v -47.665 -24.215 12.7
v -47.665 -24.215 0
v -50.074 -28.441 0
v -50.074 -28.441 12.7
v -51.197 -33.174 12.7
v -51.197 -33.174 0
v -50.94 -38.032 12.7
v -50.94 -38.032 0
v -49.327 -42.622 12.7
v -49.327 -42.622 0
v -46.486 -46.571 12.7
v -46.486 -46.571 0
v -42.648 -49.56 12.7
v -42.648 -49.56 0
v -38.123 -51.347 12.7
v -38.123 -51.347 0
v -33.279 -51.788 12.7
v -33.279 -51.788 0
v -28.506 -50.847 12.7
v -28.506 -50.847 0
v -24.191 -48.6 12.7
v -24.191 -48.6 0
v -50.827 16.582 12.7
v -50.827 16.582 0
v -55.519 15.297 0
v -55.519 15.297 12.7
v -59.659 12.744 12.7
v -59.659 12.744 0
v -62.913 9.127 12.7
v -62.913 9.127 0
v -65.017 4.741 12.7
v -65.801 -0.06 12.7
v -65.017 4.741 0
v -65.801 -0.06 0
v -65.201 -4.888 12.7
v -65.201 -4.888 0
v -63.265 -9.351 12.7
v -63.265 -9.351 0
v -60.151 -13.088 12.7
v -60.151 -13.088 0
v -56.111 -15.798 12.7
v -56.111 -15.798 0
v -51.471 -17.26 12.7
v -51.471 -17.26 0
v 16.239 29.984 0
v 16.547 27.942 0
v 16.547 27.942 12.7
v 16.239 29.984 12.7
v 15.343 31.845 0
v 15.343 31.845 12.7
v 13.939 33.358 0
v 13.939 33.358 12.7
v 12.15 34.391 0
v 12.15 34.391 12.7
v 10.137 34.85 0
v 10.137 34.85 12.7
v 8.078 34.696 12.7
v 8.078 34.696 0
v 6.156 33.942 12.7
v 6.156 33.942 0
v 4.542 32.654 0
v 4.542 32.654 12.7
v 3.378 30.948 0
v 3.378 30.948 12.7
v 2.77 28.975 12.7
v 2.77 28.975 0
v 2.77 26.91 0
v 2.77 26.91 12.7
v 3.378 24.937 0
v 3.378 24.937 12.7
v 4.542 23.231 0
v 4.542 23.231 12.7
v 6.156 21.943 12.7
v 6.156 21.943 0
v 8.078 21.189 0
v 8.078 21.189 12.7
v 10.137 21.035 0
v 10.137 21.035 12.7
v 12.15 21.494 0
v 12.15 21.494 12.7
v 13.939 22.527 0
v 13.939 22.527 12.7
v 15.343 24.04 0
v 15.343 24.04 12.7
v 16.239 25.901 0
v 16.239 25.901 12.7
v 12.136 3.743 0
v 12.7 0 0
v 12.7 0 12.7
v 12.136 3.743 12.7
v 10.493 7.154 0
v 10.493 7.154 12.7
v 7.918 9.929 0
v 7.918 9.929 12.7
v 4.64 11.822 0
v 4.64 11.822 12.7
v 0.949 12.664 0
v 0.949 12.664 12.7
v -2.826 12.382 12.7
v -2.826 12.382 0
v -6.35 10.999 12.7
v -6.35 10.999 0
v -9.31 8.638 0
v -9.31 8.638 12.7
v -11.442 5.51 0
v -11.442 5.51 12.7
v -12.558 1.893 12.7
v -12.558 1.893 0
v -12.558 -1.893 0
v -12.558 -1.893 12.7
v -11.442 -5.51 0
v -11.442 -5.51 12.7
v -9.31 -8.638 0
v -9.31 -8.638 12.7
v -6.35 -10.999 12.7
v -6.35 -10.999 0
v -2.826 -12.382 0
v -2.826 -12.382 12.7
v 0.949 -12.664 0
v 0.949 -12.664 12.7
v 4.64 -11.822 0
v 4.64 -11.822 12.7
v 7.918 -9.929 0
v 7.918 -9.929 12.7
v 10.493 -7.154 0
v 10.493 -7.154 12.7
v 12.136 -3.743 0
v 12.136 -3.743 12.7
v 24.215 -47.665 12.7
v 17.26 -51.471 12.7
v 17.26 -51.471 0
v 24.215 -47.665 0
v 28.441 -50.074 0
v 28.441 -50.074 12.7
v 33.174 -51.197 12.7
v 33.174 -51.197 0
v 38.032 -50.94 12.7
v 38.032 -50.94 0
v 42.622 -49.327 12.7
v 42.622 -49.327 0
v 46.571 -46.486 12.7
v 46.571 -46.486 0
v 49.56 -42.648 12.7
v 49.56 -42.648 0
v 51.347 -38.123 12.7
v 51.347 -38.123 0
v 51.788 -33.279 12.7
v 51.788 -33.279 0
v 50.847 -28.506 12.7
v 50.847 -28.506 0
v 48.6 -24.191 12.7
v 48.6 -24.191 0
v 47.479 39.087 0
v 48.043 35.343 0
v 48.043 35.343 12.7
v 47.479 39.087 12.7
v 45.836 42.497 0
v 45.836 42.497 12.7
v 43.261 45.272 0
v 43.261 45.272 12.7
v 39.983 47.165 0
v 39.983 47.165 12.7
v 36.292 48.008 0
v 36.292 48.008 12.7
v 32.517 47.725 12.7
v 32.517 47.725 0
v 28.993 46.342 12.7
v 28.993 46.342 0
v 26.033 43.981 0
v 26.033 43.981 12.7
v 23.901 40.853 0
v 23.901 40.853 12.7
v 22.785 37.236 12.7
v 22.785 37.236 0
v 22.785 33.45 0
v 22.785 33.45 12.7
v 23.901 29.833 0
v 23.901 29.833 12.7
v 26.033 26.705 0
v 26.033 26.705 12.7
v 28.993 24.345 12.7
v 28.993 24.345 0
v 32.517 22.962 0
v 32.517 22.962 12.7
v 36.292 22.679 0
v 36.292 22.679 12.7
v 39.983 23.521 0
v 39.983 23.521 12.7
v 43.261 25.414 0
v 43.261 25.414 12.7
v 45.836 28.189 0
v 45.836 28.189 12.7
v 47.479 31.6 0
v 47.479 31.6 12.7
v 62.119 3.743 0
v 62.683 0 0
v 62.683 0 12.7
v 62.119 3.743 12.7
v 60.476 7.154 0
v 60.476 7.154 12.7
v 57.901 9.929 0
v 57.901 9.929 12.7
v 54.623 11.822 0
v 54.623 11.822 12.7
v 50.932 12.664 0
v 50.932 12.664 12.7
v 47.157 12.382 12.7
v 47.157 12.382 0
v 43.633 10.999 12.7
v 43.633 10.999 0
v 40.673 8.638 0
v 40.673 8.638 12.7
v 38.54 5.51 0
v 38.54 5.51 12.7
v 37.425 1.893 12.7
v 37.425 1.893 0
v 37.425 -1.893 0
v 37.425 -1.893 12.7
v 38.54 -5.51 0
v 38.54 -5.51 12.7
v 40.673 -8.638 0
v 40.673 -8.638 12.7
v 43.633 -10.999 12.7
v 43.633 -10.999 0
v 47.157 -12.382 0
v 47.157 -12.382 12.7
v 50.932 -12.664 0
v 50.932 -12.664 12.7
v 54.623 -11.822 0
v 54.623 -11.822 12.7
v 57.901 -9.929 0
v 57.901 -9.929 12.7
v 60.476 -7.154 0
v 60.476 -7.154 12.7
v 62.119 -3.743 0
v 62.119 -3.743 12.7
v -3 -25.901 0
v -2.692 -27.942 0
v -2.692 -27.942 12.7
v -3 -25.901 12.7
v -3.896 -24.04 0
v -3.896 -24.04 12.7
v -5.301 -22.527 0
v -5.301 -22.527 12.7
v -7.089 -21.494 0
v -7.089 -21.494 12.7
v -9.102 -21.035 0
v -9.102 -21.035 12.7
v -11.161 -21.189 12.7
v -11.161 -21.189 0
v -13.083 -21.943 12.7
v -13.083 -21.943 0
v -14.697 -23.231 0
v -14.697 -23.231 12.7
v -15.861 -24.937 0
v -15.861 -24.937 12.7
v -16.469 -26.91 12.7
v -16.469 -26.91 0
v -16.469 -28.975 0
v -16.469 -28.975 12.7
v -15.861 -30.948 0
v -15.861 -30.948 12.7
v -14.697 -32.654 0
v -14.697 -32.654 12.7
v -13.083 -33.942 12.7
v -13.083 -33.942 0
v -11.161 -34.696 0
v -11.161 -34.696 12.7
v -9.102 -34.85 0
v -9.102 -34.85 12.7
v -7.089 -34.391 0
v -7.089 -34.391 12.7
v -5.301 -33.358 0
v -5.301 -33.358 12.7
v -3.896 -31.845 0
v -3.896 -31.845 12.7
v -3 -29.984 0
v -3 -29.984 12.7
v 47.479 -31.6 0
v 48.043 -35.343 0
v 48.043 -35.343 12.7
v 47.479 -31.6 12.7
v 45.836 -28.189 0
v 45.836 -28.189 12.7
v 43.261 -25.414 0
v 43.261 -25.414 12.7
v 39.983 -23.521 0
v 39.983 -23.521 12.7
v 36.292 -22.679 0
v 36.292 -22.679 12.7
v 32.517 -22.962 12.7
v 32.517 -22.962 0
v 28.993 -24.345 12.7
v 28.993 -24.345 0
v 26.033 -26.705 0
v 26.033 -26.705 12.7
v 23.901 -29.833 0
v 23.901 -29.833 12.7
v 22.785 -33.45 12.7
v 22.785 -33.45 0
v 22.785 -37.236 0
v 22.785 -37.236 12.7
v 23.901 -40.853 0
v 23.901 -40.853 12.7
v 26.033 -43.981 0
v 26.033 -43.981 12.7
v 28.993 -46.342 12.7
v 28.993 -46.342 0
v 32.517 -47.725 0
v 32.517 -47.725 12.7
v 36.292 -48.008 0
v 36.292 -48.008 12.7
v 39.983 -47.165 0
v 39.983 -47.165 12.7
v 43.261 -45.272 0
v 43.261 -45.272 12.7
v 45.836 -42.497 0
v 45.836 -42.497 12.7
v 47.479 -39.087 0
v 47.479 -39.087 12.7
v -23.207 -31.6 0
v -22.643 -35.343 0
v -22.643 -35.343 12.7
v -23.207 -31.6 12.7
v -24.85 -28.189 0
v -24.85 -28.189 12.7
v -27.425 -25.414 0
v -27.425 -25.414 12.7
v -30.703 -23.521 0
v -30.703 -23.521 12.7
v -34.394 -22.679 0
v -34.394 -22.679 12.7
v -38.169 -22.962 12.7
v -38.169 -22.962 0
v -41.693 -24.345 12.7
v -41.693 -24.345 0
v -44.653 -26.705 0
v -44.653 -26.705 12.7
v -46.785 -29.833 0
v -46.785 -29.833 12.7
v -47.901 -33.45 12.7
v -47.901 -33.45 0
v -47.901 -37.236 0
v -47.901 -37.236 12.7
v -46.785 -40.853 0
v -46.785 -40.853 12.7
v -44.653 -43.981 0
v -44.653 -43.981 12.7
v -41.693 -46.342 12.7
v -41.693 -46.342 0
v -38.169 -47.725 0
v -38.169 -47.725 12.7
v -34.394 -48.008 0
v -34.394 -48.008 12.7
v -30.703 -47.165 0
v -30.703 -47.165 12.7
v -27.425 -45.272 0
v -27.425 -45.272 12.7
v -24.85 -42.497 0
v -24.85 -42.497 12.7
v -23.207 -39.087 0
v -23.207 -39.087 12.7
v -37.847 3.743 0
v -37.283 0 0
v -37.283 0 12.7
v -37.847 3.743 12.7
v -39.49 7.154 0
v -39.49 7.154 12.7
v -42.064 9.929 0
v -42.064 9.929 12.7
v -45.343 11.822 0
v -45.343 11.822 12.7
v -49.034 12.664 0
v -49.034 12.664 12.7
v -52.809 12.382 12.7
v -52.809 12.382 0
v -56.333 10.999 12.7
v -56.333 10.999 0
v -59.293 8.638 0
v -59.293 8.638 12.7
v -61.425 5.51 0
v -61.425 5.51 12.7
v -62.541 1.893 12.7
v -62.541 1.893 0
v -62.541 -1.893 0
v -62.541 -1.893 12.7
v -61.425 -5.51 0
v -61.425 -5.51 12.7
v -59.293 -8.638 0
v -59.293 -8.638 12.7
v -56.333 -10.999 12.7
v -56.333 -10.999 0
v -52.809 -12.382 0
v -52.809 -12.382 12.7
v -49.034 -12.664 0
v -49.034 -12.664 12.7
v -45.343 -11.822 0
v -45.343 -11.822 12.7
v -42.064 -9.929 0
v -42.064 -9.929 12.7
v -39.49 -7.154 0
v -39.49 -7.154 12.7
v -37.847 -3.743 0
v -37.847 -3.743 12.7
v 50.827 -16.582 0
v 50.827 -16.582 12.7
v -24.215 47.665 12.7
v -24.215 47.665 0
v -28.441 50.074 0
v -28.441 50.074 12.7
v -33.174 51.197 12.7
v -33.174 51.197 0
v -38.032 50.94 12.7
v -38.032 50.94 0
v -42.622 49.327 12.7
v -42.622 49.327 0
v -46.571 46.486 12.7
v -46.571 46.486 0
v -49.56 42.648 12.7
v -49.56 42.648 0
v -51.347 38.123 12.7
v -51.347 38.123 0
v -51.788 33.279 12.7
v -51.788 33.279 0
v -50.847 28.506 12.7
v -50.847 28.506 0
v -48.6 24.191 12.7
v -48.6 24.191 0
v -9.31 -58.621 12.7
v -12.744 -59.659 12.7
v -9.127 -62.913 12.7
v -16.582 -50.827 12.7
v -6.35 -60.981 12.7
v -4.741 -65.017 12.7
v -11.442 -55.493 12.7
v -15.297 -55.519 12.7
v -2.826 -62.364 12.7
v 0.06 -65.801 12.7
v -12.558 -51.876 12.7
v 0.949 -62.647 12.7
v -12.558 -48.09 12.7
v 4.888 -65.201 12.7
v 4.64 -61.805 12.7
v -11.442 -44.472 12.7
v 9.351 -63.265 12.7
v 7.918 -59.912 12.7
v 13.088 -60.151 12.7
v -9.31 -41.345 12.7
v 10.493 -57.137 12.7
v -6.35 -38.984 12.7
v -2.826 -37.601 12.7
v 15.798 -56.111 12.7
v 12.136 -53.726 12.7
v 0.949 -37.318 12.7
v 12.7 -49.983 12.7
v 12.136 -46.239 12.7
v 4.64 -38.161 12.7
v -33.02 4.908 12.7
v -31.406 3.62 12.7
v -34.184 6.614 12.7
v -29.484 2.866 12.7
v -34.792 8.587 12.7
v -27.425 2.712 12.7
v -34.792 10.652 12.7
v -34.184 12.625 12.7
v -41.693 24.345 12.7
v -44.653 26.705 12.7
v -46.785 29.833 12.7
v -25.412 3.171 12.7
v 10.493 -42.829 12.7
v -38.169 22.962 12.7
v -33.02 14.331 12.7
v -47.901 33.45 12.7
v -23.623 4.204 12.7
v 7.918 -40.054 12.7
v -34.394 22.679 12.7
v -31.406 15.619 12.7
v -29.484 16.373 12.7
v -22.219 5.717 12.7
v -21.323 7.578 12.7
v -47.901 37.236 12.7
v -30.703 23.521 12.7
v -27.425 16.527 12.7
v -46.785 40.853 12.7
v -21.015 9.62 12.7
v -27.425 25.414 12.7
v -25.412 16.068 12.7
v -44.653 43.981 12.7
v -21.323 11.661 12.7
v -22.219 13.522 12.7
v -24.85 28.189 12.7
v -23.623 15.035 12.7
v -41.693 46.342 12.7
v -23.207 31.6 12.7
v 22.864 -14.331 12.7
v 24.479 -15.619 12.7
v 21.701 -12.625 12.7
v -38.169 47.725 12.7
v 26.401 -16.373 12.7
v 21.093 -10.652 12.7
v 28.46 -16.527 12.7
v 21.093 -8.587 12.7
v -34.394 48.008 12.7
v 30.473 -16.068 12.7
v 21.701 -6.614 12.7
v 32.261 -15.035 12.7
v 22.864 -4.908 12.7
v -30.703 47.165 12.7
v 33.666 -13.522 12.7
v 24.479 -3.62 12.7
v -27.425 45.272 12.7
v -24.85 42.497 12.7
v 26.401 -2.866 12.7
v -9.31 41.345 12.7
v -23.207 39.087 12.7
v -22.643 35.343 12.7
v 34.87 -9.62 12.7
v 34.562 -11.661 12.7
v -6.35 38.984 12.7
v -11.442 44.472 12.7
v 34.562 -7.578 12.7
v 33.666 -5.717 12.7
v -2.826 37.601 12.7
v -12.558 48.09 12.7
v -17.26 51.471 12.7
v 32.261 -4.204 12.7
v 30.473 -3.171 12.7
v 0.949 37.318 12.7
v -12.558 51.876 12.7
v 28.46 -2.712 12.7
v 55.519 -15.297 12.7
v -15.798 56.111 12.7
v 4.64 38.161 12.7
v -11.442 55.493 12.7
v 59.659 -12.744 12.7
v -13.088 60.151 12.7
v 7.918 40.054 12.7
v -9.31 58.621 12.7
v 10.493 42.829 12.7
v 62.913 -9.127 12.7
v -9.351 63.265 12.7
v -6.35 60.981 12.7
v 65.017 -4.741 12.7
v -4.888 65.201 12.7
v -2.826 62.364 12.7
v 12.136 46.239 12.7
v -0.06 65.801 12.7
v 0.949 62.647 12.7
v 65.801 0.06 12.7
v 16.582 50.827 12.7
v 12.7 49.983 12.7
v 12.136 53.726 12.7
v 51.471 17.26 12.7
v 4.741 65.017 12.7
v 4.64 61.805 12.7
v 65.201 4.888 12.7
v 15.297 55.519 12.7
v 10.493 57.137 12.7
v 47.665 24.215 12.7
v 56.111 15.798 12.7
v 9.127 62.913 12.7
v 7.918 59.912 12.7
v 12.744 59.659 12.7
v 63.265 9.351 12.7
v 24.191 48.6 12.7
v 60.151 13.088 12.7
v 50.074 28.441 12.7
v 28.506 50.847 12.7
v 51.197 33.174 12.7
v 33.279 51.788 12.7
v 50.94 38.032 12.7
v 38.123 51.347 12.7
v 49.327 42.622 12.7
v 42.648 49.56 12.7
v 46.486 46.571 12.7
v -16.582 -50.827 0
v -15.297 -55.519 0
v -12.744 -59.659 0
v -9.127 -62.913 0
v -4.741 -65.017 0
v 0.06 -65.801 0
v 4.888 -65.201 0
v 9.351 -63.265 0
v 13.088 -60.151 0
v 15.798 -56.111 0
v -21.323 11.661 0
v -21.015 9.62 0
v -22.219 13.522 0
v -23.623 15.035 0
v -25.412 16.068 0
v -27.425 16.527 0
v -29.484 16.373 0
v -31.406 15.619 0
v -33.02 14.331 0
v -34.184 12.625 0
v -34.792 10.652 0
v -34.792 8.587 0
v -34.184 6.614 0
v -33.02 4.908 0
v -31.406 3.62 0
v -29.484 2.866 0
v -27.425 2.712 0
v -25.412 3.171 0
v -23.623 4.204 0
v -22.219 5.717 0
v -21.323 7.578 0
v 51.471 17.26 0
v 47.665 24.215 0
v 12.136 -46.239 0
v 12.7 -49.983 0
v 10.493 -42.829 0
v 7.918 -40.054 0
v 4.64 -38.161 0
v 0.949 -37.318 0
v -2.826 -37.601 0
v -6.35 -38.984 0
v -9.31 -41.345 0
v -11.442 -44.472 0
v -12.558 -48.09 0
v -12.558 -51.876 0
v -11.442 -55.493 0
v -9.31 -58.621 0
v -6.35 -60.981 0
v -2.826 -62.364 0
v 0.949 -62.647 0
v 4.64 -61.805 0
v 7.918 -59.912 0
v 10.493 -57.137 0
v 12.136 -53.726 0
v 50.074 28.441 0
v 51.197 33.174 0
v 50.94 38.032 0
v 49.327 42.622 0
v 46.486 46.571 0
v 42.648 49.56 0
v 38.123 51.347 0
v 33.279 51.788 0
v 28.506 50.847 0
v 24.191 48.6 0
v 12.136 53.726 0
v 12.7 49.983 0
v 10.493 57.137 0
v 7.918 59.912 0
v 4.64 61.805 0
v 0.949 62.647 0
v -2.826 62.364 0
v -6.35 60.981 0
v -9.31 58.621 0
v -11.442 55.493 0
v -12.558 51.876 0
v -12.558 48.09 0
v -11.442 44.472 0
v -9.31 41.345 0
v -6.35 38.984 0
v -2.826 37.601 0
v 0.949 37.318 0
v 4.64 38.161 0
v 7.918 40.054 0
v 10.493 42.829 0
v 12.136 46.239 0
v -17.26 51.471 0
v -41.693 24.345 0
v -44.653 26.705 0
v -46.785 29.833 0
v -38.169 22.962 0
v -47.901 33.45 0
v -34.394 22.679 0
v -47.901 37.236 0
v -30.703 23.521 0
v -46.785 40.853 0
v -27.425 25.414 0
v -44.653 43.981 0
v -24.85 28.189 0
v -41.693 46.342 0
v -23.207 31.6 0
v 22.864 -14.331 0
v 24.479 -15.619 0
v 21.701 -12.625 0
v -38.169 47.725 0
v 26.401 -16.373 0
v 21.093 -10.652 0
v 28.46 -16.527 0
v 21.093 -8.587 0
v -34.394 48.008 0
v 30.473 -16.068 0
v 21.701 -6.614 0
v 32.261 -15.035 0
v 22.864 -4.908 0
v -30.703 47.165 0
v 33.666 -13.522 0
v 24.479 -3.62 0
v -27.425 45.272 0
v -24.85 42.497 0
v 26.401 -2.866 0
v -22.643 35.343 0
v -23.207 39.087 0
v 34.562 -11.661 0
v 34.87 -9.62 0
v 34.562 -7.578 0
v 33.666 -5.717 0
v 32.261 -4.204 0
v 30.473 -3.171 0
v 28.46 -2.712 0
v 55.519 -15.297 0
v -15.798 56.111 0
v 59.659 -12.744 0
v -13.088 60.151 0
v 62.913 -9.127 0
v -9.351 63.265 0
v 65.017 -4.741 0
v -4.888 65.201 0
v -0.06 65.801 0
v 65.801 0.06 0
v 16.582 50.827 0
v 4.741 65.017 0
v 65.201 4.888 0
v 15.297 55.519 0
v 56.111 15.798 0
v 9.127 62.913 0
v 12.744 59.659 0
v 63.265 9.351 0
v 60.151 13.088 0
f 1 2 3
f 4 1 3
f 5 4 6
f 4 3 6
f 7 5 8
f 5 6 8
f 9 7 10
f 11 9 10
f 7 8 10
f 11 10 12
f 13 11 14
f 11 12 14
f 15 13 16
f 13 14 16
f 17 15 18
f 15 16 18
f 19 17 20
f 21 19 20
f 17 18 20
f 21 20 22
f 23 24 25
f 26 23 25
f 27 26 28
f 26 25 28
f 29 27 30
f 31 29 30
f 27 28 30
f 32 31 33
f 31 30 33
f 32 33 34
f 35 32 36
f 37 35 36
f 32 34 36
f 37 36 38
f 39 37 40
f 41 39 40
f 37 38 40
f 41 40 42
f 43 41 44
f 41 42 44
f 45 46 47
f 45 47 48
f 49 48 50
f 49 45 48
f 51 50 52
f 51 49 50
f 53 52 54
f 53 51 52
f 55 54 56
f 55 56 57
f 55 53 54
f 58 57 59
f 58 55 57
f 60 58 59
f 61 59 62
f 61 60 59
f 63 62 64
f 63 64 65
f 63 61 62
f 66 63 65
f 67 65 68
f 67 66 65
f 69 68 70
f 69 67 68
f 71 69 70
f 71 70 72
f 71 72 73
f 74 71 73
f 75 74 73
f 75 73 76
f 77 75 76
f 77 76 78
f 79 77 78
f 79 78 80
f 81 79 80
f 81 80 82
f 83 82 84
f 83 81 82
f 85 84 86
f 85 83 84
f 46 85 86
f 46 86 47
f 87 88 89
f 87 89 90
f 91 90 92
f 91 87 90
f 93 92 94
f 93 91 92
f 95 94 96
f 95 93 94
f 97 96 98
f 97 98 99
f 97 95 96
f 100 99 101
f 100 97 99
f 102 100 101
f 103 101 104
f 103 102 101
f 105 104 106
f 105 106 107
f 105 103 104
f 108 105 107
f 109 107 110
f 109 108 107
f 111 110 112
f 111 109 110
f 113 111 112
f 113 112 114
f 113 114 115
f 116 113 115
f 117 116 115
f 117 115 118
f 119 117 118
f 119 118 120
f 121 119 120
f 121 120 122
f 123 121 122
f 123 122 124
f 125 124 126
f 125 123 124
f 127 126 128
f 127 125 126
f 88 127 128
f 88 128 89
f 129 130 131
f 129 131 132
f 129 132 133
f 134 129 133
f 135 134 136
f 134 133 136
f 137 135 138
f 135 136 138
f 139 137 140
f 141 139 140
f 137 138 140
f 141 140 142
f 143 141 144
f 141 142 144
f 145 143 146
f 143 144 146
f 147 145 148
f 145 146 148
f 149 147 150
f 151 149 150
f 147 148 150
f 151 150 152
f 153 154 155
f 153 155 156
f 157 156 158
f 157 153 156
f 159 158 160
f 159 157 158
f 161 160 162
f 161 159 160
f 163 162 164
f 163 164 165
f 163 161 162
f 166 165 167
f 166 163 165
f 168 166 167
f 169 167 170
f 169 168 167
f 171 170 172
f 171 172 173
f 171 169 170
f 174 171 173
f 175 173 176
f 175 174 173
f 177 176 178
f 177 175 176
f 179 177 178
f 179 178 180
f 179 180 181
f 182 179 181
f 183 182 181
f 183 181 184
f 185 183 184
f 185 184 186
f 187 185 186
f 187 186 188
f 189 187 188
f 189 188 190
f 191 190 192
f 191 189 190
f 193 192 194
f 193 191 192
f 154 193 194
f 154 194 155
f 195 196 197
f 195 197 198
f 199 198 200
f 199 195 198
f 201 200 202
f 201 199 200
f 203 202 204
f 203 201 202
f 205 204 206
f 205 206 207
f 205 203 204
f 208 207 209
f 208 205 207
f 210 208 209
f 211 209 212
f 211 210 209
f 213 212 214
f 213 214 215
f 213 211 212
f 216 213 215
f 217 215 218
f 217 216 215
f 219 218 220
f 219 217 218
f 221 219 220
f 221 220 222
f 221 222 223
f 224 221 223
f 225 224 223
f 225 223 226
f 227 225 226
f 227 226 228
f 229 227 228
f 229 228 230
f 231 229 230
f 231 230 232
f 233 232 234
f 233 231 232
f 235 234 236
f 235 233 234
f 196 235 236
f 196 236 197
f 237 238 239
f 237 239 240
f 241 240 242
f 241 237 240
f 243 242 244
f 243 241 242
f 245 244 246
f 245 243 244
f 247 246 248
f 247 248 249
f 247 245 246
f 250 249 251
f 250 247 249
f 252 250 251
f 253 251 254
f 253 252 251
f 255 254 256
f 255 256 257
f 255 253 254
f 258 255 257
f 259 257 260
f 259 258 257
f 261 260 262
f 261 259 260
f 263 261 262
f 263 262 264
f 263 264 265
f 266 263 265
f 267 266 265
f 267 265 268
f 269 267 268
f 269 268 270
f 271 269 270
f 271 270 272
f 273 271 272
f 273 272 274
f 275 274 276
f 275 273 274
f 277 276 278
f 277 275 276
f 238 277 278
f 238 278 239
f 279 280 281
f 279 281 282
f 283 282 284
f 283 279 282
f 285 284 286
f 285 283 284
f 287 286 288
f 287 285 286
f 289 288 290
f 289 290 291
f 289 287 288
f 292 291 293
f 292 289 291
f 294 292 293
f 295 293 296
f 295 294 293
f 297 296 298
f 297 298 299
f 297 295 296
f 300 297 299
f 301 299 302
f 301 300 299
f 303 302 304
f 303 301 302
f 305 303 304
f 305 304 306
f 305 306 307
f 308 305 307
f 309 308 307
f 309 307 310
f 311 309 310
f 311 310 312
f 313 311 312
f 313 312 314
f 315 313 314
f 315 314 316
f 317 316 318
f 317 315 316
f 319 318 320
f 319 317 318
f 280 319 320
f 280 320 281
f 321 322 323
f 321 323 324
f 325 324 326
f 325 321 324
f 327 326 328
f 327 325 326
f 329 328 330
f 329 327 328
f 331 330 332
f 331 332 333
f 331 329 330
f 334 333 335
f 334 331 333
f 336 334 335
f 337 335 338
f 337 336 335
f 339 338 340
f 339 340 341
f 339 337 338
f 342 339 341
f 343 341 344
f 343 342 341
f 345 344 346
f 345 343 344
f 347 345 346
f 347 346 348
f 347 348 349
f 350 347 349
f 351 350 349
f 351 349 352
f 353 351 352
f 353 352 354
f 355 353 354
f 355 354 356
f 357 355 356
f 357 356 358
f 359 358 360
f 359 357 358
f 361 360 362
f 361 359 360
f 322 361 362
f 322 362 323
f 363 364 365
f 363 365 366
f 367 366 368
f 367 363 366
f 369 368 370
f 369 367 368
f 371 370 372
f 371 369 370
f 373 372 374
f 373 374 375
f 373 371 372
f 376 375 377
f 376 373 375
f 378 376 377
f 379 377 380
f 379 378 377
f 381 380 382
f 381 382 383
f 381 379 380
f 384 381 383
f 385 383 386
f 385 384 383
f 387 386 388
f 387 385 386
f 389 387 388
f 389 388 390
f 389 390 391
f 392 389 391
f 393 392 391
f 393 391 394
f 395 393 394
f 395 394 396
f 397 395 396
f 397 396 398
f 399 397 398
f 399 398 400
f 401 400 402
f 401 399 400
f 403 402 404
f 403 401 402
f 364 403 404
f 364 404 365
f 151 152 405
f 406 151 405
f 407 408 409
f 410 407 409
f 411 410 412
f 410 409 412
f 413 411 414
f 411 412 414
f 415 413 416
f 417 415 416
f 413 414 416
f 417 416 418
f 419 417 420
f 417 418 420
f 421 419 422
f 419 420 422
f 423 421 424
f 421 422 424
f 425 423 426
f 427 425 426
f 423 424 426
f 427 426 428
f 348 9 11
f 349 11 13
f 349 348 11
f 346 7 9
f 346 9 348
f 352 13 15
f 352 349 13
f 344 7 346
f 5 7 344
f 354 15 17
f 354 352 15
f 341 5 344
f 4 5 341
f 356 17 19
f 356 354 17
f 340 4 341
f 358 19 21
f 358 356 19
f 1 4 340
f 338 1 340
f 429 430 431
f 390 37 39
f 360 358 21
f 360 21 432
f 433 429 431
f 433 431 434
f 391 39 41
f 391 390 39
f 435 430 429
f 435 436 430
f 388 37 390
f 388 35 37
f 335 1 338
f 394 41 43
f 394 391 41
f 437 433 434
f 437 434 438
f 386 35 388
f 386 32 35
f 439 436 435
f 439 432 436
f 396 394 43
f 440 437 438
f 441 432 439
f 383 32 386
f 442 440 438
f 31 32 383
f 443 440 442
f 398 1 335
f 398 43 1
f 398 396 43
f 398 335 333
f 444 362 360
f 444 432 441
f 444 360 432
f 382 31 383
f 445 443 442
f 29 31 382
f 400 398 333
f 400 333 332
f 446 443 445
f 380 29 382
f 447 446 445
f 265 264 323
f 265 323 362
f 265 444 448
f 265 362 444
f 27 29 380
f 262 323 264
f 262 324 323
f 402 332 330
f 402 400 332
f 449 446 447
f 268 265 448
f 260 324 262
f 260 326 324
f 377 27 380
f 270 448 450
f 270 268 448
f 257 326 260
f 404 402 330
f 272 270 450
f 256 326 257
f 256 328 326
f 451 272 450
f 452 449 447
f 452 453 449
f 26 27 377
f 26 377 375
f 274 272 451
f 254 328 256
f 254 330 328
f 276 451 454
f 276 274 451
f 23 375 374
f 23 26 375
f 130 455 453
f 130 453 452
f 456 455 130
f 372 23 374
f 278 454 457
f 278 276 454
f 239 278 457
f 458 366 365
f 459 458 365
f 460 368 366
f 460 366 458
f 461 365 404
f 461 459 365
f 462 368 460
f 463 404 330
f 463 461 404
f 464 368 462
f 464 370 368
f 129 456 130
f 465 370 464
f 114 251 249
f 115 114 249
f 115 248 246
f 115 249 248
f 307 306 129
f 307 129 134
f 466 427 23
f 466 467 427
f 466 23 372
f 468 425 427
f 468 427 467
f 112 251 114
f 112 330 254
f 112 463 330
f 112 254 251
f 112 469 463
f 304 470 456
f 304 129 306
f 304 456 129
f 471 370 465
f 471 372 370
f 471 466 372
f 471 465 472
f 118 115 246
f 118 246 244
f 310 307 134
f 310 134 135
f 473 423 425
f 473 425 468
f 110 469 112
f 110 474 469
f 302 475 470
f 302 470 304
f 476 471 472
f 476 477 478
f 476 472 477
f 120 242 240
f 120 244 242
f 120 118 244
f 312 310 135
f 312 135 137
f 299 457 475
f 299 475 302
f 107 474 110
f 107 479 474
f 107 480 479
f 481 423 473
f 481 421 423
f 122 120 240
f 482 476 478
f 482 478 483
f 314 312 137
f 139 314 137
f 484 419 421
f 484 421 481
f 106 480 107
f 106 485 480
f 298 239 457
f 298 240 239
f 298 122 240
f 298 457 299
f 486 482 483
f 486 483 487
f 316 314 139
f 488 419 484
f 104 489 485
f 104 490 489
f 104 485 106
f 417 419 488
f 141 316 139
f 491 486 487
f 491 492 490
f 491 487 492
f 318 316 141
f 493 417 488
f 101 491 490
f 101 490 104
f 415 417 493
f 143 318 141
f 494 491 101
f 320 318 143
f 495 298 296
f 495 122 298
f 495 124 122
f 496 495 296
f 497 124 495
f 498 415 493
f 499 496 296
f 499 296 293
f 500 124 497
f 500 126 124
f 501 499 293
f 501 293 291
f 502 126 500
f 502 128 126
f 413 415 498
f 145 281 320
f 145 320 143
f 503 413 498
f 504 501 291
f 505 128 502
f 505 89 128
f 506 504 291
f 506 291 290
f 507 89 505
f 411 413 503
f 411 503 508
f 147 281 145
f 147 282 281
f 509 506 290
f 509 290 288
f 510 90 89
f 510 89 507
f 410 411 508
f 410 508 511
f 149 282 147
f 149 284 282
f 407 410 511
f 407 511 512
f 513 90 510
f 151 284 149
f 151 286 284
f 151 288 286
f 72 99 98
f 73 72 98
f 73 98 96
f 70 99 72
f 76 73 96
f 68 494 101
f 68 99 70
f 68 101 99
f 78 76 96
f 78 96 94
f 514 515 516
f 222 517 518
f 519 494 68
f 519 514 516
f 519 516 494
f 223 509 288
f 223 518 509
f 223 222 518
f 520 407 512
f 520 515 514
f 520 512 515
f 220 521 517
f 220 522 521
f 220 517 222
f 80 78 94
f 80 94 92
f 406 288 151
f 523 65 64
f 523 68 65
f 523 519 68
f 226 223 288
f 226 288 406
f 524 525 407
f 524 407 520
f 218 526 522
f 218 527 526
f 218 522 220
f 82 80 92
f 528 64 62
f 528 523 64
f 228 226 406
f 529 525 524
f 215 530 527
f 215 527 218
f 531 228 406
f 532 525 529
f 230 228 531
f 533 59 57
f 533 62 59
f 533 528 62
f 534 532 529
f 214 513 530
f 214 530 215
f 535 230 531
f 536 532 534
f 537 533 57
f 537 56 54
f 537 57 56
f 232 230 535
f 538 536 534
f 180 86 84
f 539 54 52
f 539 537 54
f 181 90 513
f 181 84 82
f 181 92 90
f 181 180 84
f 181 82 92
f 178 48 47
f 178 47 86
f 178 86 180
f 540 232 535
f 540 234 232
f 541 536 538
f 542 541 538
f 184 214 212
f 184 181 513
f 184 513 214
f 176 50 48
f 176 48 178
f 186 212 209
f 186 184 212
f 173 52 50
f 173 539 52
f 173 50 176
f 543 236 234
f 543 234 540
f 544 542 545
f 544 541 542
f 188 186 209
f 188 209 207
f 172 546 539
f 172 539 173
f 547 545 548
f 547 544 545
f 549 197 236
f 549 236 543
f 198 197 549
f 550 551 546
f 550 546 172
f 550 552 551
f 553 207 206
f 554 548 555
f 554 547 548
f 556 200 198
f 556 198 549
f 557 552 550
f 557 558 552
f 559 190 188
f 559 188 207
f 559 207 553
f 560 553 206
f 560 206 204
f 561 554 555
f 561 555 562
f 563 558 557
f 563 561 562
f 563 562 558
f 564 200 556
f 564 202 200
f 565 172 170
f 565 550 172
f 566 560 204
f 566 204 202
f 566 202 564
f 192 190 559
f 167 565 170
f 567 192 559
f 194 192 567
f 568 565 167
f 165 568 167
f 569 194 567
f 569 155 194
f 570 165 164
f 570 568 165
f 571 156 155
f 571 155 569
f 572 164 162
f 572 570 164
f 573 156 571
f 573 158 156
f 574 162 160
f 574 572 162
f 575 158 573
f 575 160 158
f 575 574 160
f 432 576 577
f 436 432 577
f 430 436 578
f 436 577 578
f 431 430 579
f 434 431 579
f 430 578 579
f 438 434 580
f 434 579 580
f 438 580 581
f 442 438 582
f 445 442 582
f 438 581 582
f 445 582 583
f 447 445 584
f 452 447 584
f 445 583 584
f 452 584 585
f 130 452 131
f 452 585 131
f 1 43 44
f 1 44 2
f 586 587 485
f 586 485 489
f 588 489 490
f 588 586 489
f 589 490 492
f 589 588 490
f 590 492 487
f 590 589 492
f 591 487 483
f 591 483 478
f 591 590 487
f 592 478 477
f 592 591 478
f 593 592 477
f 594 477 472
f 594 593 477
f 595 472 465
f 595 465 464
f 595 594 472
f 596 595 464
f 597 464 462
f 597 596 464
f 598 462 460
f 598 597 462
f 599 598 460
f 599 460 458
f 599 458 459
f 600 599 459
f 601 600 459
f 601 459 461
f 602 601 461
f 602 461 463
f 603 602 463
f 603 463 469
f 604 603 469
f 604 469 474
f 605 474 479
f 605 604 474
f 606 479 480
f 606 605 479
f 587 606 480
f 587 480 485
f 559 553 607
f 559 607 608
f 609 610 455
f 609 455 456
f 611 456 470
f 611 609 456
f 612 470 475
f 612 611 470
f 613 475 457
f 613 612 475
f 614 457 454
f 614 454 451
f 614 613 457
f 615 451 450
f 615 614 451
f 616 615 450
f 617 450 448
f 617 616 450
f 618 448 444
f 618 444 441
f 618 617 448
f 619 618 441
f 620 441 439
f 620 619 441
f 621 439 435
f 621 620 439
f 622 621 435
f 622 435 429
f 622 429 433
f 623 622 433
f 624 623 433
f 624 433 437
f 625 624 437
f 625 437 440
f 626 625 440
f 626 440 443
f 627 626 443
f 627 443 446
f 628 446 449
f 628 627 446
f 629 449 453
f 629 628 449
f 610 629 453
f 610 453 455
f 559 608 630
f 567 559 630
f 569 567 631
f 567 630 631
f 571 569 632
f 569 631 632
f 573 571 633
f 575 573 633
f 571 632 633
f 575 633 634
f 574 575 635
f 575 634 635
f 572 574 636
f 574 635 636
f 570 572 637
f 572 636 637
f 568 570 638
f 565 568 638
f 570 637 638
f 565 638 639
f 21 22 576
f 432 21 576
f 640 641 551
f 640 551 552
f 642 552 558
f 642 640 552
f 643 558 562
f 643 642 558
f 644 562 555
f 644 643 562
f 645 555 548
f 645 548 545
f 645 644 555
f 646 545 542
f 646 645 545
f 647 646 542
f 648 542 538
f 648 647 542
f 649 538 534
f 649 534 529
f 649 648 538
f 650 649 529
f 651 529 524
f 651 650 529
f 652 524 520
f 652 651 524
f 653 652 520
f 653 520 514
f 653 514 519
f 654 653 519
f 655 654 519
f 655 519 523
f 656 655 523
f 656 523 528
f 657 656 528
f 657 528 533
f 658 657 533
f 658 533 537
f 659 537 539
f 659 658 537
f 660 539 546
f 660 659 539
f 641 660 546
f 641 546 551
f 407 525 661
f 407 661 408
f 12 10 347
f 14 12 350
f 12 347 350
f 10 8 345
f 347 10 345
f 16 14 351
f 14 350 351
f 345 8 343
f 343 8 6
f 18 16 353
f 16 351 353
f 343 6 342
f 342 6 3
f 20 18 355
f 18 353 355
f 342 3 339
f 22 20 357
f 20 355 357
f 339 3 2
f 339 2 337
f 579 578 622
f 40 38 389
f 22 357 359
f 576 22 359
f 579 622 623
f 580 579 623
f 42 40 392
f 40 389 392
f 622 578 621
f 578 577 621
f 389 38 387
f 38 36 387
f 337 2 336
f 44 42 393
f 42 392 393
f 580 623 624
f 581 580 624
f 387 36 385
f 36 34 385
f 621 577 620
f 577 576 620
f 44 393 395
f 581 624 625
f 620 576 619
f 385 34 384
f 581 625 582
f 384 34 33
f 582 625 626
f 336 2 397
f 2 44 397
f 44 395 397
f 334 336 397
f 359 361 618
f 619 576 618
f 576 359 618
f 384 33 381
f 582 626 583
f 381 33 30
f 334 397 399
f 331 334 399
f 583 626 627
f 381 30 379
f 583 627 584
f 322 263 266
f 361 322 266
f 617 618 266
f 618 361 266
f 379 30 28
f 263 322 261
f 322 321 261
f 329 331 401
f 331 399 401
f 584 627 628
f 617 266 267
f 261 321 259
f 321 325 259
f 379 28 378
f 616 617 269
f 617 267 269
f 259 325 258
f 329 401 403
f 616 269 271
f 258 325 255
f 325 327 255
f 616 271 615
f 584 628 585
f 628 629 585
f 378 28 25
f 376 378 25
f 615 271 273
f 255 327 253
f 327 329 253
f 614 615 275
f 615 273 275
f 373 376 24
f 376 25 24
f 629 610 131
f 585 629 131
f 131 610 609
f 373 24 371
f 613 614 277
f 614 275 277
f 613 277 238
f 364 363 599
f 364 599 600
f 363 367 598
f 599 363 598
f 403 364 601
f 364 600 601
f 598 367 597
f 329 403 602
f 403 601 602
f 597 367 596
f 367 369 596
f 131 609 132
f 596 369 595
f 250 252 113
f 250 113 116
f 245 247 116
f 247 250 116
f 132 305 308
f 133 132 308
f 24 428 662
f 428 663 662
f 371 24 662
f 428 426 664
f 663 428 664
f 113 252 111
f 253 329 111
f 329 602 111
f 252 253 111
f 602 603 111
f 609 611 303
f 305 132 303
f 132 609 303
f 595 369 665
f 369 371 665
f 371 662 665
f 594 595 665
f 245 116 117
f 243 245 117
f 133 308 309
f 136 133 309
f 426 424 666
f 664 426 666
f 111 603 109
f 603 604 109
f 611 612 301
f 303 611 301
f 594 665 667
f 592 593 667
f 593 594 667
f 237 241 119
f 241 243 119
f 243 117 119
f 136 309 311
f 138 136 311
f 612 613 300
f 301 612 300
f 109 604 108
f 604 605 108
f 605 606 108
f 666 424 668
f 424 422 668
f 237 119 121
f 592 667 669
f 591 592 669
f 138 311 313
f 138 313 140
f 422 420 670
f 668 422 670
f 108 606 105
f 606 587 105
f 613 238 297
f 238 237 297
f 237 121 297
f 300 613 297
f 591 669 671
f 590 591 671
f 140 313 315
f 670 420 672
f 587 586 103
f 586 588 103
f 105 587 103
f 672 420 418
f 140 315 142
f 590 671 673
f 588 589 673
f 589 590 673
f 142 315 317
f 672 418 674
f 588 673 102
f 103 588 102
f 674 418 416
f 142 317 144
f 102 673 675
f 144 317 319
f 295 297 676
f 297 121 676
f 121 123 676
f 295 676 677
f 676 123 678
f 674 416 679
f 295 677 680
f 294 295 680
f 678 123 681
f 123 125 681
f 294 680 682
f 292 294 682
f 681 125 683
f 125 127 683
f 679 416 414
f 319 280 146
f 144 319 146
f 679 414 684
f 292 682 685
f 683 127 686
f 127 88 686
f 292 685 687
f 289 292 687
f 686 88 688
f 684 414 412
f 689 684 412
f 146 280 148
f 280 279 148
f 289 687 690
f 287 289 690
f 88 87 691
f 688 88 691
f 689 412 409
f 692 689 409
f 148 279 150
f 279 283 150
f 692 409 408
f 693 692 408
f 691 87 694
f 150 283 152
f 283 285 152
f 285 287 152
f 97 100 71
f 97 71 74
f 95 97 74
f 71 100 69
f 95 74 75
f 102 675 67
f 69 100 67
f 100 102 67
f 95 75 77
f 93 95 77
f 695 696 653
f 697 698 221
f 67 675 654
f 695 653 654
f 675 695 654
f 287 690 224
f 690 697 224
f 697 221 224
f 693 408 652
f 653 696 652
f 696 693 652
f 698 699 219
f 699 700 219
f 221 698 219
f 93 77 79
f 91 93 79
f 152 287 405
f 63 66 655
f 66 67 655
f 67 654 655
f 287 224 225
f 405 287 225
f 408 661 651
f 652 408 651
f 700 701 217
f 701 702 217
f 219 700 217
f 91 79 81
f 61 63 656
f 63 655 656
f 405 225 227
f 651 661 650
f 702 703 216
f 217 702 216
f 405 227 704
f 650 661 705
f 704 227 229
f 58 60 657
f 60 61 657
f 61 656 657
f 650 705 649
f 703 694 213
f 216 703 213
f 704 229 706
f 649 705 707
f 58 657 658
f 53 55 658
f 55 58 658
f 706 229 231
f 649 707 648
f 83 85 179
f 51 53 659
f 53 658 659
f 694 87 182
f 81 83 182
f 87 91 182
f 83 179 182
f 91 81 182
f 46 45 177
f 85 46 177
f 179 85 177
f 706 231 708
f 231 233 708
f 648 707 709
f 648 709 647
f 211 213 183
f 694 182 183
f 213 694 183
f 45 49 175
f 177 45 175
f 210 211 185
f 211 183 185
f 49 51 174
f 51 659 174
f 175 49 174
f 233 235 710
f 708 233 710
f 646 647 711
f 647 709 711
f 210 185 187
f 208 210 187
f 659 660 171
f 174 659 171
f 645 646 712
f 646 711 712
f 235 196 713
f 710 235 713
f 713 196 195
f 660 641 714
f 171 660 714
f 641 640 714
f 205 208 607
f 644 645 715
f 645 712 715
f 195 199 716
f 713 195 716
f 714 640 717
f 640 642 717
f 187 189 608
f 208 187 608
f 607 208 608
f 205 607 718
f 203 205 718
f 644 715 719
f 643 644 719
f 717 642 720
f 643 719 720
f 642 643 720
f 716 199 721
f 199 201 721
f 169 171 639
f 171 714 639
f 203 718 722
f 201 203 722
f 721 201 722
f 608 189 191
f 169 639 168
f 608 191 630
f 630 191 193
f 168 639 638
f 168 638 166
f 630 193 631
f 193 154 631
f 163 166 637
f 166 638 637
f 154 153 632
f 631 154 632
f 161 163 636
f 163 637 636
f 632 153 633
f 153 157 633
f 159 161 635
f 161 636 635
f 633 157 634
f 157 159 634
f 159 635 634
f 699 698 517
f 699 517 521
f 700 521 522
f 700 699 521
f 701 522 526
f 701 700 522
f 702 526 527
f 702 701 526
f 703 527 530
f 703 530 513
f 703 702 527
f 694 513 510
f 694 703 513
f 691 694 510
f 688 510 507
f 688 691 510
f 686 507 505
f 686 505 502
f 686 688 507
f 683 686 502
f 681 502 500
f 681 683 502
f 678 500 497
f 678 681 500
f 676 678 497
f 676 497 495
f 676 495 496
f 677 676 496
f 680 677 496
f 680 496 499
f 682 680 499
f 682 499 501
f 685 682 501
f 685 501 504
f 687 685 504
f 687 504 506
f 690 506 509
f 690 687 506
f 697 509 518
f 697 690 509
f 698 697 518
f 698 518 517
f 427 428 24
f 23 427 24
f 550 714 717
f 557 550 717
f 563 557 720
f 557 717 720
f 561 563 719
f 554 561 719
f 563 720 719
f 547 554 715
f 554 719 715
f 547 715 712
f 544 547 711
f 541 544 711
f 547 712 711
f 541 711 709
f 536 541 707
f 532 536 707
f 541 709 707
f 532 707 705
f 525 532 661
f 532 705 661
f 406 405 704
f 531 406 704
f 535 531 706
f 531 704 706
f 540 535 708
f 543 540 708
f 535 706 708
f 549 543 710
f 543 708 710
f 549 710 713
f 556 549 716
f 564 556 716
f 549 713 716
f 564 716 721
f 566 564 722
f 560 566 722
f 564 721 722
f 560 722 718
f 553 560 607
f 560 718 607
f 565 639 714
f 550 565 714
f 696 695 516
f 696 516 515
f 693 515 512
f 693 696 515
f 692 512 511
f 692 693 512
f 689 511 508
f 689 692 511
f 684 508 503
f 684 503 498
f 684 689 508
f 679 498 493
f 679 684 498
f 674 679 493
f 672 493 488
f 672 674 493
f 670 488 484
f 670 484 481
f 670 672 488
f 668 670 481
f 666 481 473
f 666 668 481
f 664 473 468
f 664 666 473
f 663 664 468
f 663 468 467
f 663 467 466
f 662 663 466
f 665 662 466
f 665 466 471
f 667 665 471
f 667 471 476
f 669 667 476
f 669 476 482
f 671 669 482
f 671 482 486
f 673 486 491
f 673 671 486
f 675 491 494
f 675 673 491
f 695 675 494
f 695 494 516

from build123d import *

# Parameters (mm, degrees)
F0_R     = 12.7
F0_R_2   = 6.927169
F1_DEPTH = 12.7


with BuildPart() as f1:
    # F0 (on Top) → F1 (new body)
    with BuildSketch(Plane.XY):
        with BuildLine():
            Line((24.191197, 48.60003), (16.581545, 50.826576))
            ThreePointArc((16.581545, 50.826576), (-0.05997, 65.800738), (-17.259652, 51.47117))
            Line((-17.259652, 51.47117), (-24.214894, 47.664739))
            ThreePointArc((-24.214894, 47.664739), (-46.570553, 46.485742), (-48.60003, 24.191197))
            Line((-48.60003, 24.191197), (-50.826576, 16.581545))
            ThreePointArc((-50.826576, 16.581545), (-65.800738, -0.05997), (-51.47117, -17.259652))
            Line((-51.47117, -17.259652), (-47.664739, -24.214894))
            ThreePointArc((-47.664739, -24.214894), (-46.485742, -46.570553), (-24.191197, -48.60003))
            Line((-24.191197, -48.60003), (-16.581545, -50.826576))
            ThreePointArc((-16.581545, -50.826576), (0.05997, -65.800738), (17.259652, -51.47117))
            Line((17.259652, -51.47117), (24.214894, -47.664739))
            ThreePointArc((24.214894, -47.664739), (46.570553, -46.485742), (48.60003, -24.191197))
            Line((48.60003, -24.191197), (50.826576, -16.581545))
            ThreePointArc((50.826576, -16.581545), (65.800738, 0.05997), (51.47117, 17.259652))
            Line((51.47117, 17.259652), (47.664739, 24.214894))
            ThreePointArc((47.664739, 24.214894), (46.485742, 46.570553), (24.191197, 48.60003))
        make_face()
        with Locations((-35.343174, -35.343174)):
            Circle(F0_R, mode=Mode.SUBTRACT)
        with Locations((-9.619523, -27.942425)):
            Circle(F0_R_2, mode=Mode.SUBTRACT)
        with Locations((0, -49.982796)):
            Circle(F0_R, mode=Mode.SUBTRACT)
        with Locations((35.343174, -35.343174)):
            Circle(F0_R, mode=Mode.SUBTRACT)
        with Locations((27.942425, -9.619523)):
            Circle(F0_R_2, mode=Mode.SUBTRACT)
        with Locations((-49.982796, 0)):
            Circle(F0_R, mode=Mode.SUBTRACT)
        with Locations((-27.942425, 9.619523)):
            Circle(F0_R_2, mode=Mode.SUBTRACT)
        with Locations((-35.343174, 35.343174)):
            Circle(F0_R, mode=Mode.SUBTRACT)
        Circle(F0_R, mode=Mode.SUBTRACT)
        with Locations((9.619523, 27.942425)):
            Circle(F0_R_2, mode=Mode.SUBTRACT)
        with Locations((49.982796, 0)):
            Circle(F0_R, mode=Mode.SUBTRACT)
        with Locations((0, 49.982796)):
            Circle(F0_R, mode=Mode.SUBTRACT)
        with Locations((35.343174, 35.343174)):
            Circle(F0_R, mode=Mode.SUBTRACT)
    extrude(amount=F1_DEPTH)


solid = f1.part
